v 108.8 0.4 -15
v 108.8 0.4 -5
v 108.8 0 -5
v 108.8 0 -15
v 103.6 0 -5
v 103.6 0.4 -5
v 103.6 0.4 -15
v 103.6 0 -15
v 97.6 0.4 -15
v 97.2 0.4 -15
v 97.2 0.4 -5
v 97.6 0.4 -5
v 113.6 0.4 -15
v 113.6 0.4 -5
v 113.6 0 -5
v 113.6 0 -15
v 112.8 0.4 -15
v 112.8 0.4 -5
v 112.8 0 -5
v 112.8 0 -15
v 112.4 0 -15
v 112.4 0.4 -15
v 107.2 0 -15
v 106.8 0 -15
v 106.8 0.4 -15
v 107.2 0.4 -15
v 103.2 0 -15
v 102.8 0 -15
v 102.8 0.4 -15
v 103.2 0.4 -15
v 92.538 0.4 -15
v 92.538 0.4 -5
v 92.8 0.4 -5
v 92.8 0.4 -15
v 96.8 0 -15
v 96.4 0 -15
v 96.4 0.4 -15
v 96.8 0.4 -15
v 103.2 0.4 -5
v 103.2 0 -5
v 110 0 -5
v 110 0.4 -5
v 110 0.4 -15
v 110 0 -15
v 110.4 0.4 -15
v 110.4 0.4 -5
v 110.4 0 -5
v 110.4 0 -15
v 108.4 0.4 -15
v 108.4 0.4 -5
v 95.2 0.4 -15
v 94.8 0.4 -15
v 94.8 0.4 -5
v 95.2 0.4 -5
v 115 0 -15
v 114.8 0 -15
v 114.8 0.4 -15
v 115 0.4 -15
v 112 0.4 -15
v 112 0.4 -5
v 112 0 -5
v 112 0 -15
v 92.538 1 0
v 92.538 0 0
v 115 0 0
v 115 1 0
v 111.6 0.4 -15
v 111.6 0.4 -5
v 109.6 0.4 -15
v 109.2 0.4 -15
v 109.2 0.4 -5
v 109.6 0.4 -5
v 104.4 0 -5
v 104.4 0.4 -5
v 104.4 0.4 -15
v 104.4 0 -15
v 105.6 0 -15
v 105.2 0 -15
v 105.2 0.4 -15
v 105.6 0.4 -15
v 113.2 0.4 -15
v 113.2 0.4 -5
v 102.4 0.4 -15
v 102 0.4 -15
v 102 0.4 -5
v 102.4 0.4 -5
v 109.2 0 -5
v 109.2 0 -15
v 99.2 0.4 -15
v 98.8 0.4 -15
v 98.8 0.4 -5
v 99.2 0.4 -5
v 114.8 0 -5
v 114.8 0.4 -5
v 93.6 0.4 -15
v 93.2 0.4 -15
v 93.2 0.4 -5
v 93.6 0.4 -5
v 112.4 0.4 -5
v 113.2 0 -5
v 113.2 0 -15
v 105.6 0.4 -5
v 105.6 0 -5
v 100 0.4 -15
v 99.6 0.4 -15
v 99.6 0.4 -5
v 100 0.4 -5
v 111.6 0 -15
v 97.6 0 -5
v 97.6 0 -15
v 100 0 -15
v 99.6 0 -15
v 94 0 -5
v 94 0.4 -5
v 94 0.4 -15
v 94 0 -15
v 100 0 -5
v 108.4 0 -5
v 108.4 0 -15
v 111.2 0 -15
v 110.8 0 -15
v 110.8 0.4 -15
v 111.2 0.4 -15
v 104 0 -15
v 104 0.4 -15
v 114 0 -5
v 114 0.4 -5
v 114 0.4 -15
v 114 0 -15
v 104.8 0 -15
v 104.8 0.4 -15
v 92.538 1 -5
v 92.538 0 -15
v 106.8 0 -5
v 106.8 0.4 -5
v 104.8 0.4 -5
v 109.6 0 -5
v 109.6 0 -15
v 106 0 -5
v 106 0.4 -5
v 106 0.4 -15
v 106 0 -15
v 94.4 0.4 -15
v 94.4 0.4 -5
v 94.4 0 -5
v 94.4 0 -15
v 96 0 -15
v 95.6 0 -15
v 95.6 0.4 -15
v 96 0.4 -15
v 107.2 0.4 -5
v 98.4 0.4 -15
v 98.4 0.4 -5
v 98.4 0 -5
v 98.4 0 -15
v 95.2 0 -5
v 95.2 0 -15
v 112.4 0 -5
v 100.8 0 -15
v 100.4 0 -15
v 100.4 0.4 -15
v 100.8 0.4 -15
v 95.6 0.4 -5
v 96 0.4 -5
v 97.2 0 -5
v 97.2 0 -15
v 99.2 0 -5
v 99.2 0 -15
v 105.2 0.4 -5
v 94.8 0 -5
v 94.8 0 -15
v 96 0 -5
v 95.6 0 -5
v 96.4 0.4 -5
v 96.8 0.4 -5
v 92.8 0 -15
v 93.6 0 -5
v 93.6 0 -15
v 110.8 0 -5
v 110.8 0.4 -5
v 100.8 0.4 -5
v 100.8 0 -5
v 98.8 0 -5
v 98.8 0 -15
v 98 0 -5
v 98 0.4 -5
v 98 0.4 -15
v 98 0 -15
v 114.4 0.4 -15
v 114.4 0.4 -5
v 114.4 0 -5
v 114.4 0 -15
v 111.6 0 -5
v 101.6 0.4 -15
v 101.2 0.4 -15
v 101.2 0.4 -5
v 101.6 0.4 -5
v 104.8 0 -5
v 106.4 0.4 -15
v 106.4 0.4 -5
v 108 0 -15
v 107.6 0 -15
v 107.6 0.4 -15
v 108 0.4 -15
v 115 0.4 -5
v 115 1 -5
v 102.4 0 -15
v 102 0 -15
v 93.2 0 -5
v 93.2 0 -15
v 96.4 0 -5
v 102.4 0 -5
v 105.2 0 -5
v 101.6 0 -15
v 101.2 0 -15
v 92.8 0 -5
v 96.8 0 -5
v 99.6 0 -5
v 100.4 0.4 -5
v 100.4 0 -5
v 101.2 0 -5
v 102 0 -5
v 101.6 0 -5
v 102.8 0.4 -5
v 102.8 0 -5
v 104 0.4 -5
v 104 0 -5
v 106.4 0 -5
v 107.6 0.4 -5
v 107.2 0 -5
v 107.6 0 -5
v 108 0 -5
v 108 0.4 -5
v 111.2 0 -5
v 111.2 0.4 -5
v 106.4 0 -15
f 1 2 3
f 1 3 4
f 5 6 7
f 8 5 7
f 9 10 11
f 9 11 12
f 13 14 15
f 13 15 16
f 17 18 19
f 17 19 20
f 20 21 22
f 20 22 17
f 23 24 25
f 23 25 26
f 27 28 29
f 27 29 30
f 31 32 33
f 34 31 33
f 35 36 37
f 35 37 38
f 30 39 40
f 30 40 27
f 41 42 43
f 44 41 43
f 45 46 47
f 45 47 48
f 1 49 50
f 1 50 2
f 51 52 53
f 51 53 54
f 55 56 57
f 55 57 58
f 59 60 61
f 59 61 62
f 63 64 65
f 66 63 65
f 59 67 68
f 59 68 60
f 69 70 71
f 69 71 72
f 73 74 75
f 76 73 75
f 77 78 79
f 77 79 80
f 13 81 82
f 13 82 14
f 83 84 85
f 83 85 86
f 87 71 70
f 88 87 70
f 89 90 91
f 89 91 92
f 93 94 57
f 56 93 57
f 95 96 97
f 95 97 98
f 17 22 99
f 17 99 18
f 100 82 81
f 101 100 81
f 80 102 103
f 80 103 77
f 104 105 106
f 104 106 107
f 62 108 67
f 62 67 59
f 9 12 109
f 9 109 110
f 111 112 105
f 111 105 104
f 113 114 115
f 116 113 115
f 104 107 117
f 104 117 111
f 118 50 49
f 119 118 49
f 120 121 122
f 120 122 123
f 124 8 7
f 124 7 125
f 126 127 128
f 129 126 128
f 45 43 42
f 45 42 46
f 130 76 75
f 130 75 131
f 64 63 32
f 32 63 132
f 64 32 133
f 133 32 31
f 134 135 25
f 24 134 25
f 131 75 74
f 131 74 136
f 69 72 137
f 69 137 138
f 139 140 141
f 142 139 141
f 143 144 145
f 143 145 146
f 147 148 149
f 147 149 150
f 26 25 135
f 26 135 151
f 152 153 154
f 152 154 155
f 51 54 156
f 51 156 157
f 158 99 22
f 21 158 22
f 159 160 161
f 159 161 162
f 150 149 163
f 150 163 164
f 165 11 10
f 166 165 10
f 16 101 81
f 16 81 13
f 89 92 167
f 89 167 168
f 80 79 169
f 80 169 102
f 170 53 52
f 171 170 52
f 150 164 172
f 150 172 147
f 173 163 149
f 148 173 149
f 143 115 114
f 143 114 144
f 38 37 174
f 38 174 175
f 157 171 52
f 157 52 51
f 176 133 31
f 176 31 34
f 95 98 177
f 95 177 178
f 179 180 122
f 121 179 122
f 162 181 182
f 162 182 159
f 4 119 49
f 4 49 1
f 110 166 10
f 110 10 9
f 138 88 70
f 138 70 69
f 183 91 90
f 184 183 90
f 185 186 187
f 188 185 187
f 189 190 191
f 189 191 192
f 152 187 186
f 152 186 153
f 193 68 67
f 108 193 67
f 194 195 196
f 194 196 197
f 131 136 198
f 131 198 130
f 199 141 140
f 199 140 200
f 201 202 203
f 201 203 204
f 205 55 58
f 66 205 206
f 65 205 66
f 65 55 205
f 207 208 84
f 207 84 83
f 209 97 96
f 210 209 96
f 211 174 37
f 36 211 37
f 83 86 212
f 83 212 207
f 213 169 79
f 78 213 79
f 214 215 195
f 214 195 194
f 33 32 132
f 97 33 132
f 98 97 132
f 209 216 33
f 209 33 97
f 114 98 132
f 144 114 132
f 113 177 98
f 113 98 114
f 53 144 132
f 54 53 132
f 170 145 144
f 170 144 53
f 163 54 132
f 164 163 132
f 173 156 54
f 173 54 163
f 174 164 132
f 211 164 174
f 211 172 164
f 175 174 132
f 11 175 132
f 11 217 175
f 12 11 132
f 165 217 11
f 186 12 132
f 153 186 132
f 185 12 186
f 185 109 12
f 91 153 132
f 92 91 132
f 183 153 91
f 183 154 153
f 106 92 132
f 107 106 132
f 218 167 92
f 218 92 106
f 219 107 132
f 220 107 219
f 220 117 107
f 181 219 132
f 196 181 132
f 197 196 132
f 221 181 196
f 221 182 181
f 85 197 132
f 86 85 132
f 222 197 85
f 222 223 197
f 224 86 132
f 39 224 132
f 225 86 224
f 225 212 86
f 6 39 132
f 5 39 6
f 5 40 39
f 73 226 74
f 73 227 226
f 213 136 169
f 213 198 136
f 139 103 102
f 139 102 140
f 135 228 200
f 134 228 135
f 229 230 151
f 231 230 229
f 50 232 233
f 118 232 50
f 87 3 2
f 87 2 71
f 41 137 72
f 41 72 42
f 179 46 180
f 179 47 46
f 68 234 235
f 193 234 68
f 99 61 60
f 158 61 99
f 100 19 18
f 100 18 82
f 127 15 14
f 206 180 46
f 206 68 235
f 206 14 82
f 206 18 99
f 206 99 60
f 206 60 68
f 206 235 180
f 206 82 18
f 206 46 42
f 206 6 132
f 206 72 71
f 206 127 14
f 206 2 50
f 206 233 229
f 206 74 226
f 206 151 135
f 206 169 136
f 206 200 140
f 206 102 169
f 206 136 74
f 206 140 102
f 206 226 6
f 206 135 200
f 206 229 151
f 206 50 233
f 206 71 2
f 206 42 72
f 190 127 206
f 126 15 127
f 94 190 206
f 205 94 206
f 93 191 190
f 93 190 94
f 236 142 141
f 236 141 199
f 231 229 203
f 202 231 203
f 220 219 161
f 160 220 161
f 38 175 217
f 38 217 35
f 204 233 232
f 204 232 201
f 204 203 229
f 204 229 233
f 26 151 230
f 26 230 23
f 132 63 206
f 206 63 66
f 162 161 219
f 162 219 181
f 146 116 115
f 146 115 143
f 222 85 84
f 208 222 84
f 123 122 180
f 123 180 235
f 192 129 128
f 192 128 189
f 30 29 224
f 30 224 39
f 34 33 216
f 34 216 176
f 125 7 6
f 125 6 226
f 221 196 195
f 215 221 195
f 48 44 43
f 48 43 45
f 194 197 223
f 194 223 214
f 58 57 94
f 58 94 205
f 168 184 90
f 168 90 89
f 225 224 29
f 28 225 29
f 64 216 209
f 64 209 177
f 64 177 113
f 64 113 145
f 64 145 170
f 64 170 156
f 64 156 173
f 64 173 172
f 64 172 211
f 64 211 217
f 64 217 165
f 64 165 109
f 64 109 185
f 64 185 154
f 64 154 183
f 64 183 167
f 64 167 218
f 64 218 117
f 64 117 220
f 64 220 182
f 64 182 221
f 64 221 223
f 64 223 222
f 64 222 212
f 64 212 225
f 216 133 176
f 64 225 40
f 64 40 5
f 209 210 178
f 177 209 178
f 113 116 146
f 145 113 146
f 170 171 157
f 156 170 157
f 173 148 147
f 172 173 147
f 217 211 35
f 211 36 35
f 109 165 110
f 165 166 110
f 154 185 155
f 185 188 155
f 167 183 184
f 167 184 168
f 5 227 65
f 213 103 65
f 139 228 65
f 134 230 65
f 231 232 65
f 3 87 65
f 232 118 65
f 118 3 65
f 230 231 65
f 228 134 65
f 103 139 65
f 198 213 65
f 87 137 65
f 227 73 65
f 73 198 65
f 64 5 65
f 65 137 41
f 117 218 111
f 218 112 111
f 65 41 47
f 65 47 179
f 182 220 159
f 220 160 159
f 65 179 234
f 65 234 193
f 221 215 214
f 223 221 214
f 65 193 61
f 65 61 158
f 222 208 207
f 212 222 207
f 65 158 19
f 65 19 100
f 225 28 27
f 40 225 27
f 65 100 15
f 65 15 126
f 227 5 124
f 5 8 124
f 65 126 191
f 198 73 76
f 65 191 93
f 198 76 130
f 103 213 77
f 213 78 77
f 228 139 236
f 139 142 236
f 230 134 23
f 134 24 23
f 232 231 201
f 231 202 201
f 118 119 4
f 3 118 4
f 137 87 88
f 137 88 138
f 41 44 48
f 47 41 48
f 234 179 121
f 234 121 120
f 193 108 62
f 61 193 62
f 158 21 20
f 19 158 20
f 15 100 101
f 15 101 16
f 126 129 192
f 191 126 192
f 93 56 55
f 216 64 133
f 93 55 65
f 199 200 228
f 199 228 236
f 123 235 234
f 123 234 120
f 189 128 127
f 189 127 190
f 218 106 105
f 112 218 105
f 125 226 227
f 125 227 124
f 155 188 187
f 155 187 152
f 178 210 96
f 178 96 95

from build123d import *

# Parameters (mm, degrees)
SKETCH1_W           = 115
SKETCH1_H           = 15
BOSS_EXTRUDE1_DEPTH = 0.5
SKETCH2_W           = 115
SKETCH2_H           = 10
CUT_EXTRUDE1_DEPTH  = 0.1
SKETCH3_W           = 0.4
SKETCH3_H           = 10
CUT_EXTRUDE2_DEPTH  = 0.4
LPATTERN3_COUNT     = 150
LPATTERN3_PITCH     = 0.8
SKETCH4_W           = 115
SKETCH4_H           = 5
BOSS_EXTRUDE2_DEPTH = 1
SKETCH5_W           = 77.289086501
SKETCH5_H           = 15.822063322
CUT_EXTRUDE3_DEPTH  = 1
SKETCH6_W           = 3.197112069
SKETCH6_H           = 15.066627115
CUT_EXTRUDE4_DEPTH  = 1
SKETCH7_W           = 12.052245582
SKETCH7_H           = 15.126214191
CUT_EXTRUDE5_DEPTH  = 10


with BuildPart() as part:
    # Sketch1 → Boss-Extrude1 (new body)
    with BuildSketch(Plane(origin=(0, 0, 0), x_dir=(1, 0, 0), z_dir=(0, 1, 0))):
        with Locations((57.5, 7.5)):
            Rectangle(SKETCH1_W, SKETCH1_H)
    extrude(amount=BOSS_EXTRUDE1_DEPTH)

    # Sketch2 → Cut-Extrude1 (cut)
    with BuildSketch(Plane(origin=(0, 0.5, 0), x_dir=(1, 0, 0), z_dir=(0, 1, 0))):
        with Locations((57.5, 10)):
            Rectangle(SKETCH2_W, SKETCH2_H)
    extrude(amount=-CUT_EXTRUDE1_DEPTH, mode=Mode.SUBTRACT)

    # Sketch3 → Cut-Extrude2 (cut)
    with BuildSketch(Plane(origin=(0, 0.4, 0), x_dir=(1, 0, 0), z_dir=(0, 1, 0))):
        with Locations((0.2, 10)):
            Rectangle(SKETCH3_W, SKETCH3_H)
    cut_extrude2 = extrude(amount=-CUT_EXTRUDE2_DEPTH, mode=Mode.SUBTRACT)

    # LPattern3: Cut-Extrude2 ×150
    with Locations(*[(i * LPATTERN3_PITCH, 0, 0) for i in range(1, LPATTERN3_COUNT)]):
        add(cut_extrude2, mode=Mode.SUBTRACT)

    # Sketch4 → Boss-Extrude2 (add)
    with BuildSketch(Plane.XZ):
        with Locations((57.5, -2.5)):
            Rectangle(SKETCH4_W, SKETCH4_H)
    extrude(amount=-BOSS_EXTRUDE2_DEPTH)

    # Sketch5 → Cut-Extrude3 (cut)
    with BuildSketch(Plane(origin=(0, 1, 0), x_dir=(1, 0, 0), z_dir=(0, 1, 0))):
        with Locations((38.64454325, 7.911031661)):
            Rectangle(SKETCH5_W, SKETCH5_H)
    extrude(amount=-CUT_EXTRUDE3_DEPTH, mode=Mode.SUBTRACT)

    # Sketch6 → Cut-Extrude4 (cut)
    with BuildSketch(Plane(origin=(0, 1, 0), x_dir=(1, 0, 0), z_dir=(0, 1, 0))):
        with Locations((78.887642535, 7.533313558)):
            Rectangle(SKETCH6_W, SKETCH6_H)
    extrude(amount=-CUT_EXTRUDE4_DEPTH, mode=Mode.SUBTRACT)

    # Sketch7 → Cut-Extrude5 (cut)
    with BuildSketch(Plane(origin=(0, 1, 0), x_dir=(1, 0, 0), z_dir=(0, 1, 0))):
        with Locations((86.512321361, 7.563107096)):
            Rectangle(SKETCH7_W, SKETCH7_H)
    extrude(amount=-CUT_EXTRUDE5_DEPTH, mode=Mode.SUBTRACT)


solid = part.part
